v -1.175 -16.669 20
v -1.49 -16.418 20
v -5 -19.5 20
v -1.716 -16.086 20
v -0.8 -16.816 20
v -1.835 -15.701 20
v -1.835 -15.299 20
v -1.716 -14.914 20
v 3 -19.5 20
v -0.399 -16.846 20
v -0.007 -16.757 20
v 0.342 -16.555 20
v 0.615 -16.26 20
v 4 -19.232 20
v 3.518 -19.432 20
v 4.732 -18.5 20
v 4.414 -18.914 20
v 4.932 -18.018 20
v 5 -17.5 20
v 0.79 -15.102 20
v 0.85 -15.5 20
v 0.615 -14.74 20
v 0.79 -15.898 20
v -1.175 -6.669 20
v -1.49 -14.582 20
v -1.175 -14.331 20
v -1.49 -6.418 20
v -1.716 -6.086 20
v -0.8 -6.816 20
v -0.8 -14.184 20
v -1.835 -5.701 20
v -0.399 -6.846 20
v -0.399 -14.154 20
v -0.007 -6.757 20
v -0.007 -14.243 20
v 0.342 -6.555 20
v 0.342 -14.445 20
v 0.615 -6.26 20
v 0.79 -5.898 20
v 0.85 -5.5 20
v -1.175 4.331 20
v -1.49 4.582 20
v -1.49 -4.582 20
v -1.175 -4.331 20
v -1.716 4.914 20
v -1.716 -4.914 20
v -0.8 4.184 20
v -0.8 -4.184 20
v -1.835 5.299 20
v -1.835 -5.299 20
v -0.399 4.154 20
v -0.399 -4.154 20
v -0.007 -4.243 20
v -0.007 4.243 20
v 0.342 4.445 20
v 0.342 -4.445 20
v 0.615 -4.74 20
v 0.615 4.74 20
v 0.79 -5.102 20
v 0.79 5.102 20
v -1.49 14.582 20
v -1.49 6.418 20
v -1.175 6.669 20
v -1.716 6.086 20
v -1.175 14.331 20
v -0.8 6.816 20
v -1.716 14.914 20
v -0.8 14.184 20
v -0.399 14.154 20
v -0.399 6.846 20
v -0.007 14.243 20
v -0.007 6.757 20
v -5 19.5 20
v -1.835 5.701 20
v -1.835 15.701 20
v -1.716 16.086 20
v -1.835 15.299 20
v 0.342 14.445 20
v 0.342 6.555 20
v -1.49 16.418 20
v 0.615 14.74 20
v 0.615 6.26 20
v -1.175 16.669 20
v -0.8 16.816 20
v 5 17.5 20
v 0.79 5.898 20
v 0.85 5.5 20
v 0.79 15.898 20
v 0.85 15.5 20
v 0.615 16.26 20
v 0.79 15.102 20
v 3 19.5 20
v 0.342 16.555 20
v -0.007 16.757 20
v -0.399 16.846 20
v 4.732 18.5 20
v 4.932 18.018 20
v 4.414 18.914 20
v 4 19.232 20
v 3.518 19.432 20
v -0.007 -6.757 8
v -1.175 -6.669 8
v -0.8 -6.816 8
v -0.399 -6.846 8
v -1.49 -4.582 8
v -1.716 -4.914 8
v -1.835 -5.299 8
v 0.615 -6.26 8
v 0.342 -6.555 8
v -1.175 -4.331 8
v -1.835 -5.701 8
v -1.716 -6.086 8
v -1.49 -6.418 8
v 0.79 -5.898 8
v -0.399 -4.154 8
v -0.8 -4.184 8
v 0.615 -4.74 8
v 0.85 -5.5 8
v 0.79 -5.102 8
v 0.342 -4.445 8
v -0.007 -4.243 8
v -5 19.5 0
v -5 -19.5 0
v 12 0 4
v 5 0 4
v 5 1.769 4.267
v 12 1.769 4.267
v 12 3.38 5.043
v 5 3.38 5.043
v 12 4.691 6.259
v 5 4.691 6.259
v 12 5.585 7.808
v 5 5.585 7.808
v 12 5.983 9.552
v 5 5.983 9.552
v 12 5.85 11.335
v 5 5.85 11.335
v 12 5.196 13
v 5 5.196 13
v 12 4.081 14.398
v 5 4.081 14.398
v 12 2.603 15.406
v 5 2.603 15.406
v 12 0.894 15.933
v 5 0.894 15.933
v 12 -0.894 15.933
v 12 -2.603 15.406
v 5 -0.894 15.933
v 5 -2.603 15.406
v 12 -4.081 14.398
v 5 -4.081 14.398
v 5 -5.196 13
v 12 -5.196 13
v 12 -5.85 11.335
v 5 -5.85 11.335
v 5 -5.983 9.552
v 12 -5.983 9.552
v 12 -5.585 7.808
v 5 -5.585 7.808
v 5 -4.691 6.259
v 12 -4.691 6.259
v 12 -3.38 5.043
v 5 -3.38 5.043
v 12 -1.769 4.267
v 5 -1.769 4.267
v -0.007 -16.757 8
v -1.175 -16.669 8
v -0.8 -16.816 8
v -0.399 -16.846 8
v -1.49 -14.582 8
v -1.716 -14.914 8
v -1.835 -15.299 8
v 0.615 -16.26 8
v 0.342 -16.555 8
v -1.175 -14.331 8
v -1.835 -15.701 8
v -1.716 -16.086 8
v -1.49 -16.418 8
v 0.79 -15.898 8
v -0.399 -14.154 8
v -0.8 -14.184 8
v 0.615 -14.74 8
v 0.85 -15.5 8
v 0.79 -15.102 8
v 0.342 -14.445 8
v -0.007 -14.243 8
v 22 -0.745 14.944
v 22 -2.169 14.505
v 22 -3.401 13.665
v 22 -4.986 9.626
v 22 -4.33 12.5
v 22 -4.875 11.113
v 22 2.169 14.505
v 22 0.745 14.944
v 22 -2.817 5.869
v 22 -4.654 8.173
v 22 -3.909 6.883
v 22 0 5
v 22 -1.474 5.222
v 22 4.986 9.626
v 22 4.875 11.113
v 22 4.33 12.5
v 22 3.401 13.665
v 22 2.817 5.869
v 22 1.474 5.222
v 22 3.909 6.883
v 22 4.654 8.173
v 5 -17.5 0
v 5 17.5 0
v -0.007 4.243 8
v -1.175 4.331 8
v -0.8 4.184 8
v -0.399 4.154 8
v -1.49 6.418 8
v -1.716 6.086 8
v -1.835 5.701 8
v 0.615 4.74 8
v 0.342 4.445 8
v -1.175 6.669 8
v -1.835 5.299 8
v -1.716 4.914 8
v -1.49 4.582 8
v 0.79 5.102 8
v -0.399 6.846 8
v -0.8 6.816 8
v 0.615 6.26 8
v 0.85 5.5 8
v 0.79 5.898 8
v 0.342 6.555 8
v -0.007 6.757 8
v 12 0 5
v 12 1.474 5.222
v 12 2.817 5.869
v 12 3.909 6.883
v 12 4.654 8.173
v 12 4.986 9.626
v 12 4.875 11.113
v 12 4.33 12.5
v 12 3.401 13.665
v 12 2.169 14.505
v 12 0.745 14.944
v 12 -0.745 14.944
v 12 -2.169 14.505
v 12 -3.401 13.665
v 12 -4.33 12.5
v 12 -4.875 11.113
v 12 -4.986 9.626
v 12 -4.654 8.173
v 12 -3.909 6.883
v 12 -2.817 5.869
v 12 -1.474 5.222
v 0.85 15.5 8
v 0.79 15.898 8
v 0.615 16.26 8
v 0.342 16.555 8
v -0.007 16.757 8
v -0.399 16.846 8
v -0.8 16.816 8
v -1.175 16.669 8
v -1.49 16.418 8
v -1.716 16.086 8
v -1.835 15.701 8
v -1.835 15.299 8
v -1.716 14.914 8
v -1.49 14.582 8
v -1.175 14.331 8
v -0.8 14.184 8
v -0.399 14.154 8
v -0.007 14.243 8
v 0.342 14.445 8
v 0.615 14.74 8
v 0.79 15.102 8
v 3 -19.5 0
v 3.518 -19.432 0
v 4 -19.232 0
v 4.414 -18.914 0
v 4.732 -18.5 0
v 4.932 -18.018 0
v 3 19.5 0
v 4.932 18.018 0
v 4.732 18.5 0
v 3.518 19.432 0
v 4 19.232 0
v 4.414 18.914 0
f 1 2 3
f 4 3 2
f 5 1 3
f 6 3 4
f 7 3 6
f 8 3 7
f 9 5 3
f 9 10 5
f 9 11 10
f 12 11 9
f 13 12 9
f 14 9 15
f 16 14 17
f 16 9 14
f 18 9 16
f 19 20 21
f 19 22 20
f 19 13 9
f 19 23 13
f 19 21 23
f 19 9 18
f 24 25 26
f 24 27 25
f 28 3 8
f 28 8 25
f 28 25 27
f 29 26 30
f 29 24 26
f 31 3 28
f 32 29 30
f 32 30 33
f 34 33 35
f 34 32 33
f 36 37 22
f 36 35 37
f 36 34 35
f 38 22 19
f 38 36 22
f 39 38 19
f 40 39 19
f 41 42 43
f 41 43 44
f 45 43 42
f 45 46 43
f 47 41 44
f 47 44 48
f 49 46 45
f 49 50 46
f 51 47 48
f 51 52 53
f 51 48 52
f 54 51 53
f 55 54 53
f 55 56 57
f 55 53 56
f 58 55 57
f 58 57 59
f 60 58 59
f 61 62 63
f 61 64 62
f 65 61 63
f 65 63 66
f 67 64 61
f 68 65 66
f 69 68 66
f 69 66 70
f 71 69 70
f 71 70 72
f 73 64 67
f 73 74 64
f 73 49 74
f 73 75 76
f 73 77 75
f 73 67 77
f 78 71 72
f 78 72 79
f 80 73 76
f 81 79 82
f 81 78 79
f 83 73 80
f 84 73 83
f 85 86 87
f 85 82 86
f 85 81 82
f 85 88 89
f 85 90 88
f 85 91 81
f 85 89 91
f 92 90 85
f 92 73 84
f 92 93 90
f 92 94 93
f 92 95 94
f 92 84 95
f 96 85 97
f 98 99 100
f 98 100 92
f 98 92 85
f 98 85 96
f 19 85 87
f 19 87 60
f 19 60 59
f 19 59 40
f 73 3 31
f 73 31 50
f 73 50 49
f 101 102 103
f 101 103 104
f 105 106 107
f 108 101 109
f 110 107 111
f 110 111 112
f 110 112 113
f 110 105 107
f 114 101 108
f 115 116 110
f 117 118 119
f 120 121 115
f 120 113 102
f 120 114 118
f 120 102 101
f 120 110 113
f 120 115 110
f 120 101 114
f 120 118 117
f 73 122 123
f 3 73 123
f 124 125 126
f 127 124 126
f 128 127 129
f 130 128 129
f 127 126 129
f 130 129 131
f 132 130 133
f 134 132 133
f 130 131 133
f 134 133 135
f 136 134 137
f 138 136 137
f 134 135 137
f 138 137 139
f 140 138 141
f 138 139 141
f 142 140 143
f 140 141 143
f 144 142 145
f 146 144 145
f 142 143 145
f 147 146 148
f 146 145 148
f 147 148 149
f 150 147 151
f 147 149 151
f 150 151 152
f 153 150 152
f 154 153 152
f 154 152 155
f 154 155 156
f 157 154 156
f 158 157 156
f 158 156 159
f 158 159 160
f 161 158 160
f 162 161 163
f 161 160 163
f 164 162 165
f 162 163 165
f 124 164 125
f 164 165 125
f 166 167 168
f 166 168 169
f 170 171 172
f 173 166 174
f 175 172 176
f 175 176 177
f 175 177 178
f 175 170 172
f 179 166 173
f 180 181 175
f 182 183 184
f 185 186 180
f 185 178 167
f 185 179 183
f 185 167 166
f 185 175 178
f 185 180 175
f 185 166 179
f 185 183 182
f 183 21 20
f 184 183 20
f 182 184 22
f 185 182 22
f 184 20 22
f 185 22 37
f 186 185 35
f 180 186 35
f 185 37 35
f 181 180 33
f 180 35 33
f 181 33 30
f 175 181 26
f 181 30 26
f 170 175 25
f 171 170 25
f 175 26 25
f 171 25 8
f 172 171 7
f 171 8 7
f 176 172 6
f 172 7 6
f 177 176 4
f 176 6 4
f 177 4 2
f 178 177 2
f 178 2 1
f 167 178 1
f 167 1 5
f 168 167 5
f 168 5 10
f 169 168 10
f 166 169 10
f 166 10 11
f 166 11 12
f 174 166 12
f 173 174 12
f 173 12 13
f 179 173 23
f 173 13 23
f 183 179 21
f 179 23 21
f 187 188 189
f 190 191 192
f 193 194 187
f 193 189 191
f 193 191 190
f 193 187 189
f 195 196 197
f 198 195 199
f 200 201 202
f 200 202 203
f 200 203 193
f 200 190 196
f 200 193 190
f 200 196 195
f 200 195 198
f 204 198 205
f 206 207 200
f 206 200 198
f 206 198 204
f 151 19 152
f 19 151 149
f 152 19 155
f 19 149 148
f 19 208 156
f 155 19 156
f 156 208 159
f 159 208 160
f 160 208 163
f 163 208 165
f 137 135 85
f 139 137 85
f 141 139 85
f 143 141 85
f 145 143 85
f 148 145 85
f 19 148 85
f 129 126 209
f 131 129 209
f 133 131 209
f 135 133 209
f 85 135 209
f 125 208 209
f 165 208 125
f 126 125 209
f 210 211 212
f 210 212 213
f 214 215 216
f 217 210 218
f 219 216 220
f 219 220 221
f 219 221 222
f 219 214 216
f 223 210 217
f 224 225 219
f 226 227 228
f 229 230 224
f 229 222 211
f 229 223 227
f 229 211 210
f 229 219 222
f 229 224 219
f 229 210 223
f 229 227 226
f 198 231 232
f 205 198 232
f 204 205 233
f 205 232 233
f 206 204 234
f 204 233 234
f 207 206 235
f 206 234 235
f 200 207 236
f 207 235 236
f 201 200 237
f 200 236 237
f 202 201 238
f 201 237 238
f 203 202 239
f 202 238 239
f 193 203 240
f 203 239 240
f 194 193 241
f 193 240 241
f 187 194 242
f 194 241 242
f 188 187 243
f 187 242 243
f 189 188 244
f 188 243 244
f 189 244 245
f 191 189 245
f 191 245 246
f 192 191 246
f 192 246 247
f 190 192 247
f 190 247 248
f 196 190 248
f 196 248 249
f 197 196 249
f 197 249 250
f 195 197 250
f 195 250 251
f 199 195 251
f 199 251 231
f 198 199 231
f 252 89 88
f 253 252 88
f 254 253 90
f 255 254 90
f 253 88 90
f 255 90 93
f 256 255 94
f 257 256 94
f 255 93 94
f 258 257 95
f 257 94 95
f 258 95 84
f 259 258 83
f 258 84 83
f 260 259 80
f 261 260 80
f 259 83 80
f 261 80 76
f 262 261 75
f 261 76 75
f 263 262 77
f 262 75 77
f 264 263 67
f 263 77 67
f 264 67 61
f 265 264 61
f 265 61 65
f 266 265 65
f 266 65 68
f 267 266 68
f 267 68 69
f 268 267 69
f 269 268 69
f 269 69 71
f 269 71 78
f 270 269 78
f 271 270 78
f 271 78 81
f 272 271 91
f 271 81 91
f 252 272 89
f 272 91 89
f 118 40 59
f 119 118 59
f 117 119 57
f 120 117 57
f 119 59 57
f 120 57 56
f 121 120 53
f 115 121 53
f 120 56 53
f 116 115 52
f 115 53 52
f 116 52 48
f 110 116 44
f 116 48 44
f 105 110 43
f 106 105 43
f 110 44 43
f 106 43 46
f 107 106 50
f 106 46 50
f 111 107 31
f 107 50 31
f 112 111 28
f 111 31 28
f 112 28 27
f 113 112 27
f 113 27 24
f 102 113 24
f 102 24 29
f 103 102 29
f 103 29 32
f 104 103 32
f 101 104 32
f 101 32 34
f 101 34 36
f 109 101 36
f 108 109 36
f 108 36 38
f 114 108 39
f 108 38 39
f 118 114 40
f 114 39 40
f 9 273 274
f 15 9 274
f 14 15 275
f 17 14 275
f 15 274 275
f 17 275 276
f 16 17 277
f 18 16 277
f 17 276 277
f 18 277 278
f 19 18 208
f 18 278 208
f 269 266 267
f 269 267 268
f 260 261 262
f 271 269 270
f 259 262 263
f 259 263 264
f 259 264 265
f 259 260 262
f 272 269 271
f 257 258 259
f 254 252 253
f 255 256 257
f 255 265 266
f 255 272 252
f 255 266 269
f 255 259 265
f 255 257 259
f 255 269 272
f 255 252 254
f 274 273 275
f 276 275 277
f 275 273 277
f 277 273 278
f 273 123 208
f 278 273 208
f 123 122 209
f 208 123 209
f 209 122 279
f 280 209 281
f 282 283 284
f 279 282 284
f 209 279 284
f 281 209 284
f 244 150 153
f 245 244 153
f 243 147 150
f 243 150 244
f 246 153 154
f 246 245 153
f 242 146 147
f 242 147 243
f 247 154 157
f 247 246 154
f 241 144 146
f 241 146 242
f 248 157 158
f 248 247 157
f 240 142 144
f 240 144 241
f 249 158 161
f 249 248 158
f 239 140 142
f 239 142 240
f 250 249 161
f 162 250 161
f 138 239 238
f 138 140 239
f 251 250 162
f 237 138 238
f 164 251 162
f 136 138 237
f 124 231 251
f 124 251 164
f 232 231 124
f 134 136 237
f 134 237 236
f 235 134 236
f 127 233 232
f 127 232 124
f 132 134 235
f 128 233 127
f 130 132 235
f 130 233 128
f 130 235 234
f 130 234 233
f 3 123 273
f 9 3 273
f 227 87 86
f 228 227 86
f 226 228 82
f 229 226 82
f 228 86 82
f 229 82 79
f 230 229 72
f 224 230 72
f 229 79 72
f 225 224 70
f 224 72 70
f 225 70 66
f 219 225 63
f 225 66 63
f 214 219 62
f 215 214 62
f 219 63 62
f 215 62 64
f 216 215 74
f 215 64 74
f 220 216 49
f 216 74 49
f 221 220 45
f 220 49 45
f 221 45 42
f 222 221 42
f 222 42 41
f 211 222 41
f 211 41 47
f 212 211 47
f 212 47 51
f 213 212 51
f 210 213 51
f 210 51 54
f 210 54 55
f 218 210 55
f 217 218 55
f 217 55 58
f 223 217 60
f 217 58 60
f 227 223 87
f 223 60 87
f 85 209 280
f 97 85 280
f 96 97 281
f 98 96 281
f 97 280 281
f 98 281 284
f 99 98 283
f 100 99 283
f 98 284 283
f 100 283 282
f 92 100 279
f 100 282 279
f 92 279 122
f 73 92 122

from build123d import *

# Parameters (mm, degrees)
BOSS_EXTRUDE1_DEPTH = 20
SKETCH2_R           = 1.35
CUT_EXTRUDE2_DEPTH  = 12
SKETCH3_R           = 5
BOSS_EXTRUDE2_DEPTH = 17
SKETCH4_R           = 6
BOSS_EXTRUDE3_DEPTH = 7


with BuildPart() as part:
    # Sketch1 → Boss-Extrude1 (new body)
    with BuildSketch(Plane.XY):
        with BuildLine():
            Line((-5, -19.5), (3, -19.5))
            ThreePointArc((3, -19.5), (4.414213562, -18.914213562), (5, -17.5))
            Line((5, -17.5), (5, 17.5))
            ThreePointArc((5, 17.5), (4.414213562, 18.914213562), (3, 19.5))
            Line((3, 19.5), (-5, 19.5))
            Line((-5, 19.5), (-5, -19.5))
        make_face()
    extrude(amount=BOSS_EXTRUDE1_DEPTH)

    # Sketch2 → Cut-Extrude2 (cut)
    with BuildSketch(Plane.XY.offset(20)):
        with Locations((-0.5, 15.5)):
            Circle(SKETCH2_R)
        with Locations((-0.5, 5.5)):
            Circle(SKETCH2_R)
        with Locations((-0.5, -15.5)):
            Circle(SKETCH2_R)
        with Locations((-0.5, -5.5)):
            Circle(SKETCH2_R)
    extrude(amount=-CUT_EXTRUDE2_DEPTH, mode=Mode.SUBTRACT)

    # Sketch3 → Boss-Extrude2 (add)
    with BuildSketch(Plane(origin=(5, 0, 0), x_dir=(0, 0, -1), z_dir=(1, 0, 0))):
        with Locations((-10, 0)):
            Circle(SKETCH3_R)
    extrude(amount=BOSS_EXTRUDE2_DEPTH)

    # Sketch4 → Boss-Extrude3 (add)
    with BuildSketch(Plane(origin=(5, 0, 0), x_dir=(0, 0, -1), z_dir=(1, 0, 0))):
        with Locations((-10, 0)):
            Circle(SKETCH4_R)
    extrude(amount=BOSS_EXTRUDE3_DEPTH)


solid = part.part
